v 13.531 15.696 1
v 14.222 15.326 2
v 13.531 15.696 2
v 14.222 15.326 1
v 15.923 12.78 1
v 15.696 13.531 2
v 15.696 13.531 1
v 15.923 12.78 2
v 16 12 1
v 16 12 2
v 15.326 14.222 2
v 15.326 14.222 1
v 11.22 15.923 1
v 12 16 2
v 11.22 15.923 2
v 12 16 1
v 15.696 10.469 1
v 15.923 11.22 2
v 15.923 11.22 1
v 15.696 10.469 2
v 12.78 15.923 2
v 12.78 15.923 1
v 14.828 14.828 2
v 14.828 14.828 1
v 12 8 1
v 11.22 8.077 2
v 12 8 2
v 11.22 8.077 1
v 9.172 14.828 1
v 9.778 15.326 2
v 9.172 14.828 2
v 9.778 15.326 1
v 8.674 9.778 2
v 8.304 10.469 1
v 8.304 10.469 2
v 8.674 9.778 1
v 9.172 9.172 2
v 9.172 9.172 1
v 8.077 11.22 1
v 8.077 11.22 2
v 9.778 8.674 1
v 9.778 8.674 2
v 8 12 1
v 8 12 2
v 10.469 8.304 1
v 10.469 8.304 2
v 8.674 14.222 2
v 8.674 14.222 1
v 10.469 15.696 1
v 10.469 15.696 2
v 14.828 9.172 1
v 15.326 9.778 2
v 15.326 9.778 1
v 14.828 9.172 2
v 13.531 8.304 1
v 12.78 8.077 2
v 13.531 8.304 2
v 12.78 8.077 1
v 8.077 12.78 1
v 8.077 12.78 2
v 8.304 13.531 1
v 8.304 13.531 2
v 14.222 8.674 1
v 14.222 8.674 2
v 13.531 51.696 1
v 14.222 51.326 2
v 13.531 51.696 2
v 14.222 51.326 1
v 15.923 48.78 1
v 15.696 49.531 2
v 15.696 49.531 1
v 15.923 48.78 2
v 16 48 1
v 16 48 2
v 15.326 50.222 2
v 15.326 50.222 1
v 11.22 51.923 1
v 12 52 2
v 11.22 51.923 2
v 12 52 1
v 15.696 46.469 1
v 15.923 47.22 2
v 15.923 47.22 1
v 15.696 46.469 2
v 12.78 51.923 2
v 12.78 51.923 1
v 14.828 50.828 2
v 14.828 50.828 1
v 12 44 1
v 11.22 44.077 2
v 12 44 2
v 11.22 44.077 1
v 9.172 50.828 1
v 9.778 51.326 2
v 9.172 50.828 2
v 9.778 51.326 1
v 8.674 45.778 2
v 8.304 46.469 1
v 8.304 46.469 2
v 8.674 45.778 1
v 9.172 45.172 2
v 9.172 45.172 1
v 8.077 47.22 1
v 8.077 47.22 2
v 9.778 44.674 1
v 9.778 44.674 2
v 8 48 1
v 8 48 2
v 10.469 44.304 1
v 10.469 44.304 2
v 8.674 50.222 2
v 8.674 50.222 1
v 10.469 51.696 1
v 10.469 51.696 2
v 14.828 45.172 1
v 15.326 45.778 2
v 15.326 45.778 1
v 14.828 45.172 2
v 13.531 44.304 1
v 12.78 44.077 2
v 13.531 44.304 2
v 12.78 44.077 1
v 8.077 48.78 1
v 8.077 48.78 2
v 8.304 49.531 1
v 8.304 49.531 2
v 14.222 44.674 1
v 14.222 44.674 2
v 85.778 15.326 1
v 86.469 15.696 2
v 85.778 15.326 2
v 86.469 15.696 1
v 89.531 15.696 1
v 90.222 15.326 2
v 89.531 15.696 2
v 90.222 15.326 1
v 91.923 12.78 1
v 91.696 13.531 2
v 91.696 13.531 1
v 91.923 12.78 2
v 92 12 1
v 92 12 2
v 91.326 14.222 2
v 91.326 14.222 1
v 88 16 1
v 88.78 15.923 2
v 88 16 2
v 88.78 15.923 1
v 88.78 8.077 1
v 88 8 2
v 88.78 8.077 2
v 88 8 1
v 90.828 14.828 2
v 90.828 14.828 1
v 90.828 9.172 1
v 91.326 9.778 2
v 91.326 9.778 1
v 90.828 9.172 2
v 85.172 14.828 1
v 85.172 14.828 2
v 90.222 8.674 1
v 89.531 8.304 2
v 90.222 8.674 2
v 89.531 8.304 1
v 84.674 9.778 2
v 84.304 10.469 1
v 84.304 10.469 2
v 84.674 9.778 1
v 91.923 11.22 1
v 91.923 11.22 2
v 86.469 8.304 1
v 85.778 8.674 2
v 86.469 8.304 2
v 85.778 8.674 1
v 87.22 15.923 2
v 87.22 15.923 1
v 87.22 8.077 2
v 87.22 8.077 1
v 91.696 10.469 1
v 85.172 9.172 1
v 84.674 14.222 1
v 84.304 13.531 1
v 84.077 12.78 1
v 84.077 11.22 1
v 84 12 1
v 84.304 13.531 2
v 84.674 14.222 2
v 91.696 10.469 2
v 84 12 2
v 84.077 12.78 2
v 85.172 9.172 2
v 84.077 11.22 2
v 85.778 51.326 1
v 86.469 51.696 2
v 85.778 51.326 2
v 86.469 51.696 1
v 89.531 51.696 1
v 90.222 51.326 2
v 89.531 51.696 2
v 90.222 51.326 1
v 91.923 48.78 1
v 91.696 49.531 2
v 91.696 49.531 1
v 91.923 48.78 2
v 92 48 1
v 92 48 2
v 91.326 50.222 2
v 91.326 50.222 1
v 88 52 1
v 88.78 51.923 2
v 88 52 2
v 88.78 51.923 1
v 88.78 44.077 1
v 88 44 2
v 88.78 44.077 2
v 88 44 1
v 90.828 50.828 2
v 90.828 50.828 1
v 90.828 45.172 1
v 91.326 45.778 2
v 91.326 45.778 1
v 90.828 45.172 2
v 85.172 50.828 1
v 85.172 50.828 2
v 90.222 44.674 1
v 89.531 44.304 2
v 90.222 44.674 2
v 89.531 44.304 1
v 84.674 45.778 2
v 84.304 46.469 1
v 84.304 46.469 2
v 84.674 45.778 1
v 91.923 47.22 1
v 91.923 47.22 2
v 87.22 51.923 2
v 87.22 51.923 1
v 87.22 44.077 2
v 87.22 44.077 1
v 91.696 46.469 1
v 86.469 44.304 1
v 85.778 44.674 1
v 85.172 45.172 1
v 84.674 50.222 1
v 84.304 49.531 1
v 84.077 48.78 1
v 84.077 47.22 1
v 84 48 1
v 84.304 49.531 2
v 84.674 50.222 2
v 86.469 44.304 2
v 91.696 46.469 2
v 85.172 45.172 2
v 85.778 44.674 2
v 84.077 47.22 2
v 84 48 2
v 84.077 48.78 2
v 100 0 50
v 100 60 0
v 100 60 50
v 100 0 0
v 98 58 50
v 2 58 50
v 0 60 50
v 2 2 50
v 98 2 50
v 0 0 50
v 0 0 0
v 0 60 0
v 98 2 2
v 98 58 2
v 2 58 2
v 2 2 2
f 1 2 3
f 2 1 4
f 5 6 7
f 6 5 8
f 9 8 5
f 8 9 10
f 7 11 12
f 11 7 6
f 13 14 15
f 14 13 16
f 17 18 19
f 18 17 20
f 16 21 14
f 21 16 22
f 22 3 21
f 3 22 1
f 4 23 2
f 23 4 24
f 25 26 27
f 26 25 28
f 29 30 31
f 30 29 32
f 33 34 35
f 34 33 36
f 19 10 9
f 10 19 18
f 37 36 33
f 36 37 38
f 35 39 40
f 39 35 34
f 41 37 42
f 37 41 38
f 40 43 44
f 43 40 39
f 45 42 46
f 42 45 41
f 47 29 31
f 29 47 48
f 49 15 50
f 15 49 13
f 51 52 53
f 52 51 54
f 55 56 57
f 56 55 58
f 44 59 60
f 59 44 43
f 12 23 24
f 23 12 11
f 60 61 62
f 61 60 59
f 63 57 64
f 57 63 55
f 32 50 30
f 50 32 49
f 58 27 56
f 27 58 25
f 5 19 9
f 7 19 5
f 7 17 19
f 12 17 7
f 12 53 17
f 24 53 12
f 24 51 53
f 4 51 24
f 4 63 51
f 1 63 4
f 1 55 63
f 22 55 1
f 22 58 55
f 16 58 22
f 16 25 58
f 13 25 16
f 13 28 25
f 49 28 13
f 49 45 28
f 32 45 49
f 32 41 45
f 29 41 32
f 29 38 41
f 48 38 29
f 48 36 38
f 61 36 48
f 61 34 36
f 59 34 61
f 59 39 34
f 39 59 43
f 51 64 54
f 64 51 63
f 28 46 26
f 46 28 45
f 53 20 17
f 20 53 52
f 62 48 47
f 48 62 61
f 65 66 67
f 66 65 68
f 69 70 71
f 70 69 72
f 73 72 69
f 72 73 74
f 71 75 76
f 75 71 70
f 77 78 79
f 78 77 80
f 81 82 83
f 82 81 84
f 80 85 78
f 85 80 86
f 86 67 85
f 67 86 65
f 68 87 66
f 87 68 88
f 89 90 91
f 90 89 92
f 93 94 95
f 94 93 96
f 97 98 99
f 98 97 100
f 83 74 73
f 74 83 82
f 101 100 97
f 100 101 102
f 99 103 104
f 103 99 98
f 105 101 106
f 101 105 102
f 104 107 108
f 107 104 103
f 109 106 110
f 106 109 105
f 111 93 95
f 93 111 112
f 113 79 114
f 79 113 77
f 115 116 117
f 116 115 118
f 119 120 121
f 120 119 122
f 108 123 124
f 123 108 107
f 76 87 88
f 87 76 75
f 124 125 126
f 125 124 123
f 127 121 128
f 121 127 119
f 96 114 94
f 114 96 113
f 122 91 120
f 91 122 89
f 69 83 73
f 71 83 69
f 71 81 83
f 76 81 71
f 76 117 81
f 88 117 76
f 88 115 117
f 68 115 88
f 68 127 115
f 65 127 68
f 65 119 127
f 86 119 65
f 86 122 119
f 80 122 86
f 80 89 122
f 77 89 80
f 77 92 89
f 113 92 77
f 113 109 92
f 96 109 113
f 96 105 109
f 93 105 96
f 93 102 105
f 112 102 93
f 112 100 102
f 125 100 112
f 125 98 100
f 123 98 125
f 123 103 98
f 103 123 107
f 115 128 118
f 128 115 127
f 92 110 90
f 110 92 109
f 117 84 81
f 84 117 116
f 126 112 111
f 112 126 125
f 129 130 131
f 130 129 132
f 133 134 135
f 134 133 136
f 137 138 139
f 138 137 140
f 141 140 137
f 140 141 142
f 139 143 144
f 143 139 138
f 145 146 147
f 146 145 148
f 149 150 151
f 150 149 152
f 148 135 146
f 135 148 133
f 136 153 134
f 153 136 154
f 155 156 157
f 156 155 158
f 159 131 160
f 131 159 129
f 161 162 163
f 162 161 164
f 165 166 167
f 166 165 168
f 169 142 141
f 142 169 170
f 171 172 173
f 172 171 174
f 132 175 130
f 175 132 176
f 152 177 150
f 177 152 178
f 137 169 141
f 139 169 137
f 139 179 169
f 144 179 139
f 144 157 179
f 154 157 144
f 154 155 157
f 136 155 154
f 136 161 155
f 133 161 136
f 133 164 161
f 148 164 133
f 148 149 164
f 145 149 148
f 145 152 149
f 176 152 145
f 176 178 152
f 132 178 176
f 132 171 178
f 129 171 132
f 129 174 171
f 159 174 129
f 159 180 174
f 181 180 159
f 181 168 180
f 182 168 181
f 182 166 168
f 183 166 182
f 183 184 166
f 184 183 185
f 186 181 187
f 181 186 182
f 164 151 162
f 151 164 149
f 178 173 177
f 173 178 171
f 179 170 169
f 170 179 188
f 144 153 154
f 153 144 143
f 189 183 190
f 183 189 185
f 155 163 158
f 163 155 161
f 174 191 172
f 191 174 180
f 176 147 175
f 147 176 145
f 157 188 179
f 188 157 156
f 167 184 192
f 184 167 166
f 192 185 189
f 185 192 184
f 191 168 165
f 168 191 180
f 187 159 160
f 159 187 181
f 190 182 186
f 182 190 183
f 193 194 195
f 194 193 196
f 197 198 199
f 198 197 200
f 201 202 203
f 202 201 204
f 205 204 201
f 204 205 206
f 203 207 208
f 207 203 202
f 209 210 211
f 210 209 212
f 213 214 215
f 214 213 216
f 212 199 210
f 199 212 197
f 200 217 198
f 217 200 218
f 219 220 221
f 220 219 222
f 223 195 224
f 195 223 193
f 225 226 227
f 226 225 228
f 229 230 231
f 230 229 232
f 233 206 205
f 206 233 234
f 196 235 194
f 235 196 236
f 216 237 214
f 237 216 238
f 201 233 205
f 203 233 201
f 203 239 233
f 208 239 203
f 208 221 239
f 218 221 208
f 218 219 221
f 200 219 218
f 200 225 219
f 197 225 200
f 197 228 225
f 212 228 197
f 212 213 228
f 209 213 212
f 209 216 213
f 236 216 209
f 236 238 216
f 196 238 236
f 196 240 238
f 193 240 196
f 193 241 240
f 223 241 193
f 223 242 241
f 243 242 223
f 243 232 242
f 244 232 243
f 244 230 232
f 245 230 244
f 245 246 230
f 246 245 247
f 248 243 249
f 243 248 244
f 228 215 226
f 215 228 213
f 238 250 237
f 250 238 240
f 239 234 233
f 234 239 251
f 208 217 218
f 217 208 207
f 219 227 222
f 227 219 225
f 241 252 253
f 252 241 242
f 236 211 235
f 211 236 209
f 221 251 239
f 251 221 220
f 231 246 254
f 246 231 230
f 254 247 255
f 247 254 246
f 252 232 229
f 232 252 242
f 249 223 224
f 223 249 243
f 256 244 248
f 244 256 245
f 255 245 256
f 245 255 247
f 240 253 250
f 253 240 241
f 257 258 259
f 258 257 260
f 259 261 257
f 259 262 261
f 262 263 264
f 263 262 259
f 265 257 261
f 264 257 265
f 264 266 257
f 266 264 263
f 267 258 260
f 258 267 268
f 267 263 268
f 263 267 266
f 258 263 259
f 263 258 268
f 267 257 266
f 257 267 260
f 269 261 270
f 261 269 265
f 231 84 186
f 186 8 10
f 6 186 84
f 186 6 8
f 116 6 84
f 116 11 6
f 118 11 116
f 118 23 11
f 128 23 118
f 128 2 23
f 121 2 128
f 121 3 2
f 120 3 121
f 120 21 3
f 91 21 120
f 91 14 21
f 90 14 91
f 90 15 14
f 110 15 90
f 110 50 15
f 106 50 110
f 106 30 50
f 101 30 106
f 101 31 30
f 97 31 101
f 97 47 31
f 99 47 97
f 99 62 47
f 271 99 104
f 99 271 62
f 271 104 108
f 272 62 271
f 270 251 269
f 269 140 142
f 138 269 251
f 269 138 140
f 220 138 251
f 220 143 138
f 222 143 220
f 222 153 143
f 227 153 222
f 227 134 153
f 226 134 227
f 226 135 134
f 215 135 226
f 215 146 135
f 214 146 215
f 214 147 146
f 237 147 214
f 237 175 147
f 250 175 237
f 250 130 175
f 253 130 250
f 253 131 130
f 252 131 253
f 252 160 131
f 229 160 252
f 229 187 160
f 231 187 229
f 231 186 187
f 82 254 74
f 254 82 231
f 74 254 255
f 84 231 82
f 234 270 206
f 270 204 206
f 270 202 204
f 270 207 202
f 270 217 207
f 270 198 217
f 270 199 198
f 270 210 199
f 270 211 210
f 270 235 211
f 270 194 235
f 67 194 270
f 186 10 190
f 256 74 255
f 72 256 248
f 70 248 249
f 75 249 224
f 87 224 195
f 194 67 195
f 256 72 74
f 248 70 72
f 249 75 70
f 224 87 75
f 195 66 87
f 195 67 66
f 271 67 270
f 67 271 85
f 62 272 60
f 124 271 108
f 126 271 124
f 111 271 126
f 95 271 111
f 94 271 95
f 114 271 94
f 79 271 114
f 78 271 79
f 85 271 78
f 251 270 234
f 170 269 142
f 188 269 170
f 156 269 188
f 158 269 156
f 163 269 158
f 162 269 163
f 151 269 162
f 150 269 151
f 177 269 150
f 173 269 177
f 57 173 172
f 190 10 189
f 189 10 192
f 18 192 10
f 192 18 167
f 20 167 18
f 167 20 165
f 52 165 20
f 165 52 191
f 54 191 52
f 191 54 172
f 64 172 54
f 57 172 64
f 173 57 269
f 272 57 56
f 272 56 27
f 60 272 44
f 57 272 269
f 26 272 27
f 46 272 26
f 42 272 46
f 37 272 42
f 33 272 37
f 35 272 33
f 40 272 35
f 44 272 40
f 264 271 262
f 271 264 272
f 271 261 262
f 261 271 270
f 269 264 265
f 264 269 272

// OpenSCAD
$fn = 32;

// ----------------------------------------------------------------------
// Enclosure box: bosses enclosure
// ----------------------------------------------------------------------

// --- parameters (mm) ---
box_l = 100;              // outer length, X
box_w = 60;               // outer width, Y
box_h = 50;               // outer height
wall_t = 2;               // wall thickness
boss_r = 4;               // corner boss radius
hole_r = 1.5;             // boss screw hole radius
boss_in = 12;             // boss inset from the corners

inner_h = box_h - wall_t;  // cavity depth
boss_h = inner_h - 2;  // corner boss height

difference() {
  cube([box_l, box_w, box_h]);
  translate([wall_t, wall_t, wall_t])
    cube([box_l - 2 * wall_t, box_w - 2 * wall_t, box_h]);
  for (sx = [0, 1], sy = [0, 1])
    translate([sx ? box_l - boss_in : boss_in,
               sy ? box_w - boss_in : boss_in, wall_t - 1]) {
      cylinder(r = boss_r, h = boss_h);
      translate([0, 0, boss_h - 4])
        cylinder(r = hole_r, h = 5);
    }
}
